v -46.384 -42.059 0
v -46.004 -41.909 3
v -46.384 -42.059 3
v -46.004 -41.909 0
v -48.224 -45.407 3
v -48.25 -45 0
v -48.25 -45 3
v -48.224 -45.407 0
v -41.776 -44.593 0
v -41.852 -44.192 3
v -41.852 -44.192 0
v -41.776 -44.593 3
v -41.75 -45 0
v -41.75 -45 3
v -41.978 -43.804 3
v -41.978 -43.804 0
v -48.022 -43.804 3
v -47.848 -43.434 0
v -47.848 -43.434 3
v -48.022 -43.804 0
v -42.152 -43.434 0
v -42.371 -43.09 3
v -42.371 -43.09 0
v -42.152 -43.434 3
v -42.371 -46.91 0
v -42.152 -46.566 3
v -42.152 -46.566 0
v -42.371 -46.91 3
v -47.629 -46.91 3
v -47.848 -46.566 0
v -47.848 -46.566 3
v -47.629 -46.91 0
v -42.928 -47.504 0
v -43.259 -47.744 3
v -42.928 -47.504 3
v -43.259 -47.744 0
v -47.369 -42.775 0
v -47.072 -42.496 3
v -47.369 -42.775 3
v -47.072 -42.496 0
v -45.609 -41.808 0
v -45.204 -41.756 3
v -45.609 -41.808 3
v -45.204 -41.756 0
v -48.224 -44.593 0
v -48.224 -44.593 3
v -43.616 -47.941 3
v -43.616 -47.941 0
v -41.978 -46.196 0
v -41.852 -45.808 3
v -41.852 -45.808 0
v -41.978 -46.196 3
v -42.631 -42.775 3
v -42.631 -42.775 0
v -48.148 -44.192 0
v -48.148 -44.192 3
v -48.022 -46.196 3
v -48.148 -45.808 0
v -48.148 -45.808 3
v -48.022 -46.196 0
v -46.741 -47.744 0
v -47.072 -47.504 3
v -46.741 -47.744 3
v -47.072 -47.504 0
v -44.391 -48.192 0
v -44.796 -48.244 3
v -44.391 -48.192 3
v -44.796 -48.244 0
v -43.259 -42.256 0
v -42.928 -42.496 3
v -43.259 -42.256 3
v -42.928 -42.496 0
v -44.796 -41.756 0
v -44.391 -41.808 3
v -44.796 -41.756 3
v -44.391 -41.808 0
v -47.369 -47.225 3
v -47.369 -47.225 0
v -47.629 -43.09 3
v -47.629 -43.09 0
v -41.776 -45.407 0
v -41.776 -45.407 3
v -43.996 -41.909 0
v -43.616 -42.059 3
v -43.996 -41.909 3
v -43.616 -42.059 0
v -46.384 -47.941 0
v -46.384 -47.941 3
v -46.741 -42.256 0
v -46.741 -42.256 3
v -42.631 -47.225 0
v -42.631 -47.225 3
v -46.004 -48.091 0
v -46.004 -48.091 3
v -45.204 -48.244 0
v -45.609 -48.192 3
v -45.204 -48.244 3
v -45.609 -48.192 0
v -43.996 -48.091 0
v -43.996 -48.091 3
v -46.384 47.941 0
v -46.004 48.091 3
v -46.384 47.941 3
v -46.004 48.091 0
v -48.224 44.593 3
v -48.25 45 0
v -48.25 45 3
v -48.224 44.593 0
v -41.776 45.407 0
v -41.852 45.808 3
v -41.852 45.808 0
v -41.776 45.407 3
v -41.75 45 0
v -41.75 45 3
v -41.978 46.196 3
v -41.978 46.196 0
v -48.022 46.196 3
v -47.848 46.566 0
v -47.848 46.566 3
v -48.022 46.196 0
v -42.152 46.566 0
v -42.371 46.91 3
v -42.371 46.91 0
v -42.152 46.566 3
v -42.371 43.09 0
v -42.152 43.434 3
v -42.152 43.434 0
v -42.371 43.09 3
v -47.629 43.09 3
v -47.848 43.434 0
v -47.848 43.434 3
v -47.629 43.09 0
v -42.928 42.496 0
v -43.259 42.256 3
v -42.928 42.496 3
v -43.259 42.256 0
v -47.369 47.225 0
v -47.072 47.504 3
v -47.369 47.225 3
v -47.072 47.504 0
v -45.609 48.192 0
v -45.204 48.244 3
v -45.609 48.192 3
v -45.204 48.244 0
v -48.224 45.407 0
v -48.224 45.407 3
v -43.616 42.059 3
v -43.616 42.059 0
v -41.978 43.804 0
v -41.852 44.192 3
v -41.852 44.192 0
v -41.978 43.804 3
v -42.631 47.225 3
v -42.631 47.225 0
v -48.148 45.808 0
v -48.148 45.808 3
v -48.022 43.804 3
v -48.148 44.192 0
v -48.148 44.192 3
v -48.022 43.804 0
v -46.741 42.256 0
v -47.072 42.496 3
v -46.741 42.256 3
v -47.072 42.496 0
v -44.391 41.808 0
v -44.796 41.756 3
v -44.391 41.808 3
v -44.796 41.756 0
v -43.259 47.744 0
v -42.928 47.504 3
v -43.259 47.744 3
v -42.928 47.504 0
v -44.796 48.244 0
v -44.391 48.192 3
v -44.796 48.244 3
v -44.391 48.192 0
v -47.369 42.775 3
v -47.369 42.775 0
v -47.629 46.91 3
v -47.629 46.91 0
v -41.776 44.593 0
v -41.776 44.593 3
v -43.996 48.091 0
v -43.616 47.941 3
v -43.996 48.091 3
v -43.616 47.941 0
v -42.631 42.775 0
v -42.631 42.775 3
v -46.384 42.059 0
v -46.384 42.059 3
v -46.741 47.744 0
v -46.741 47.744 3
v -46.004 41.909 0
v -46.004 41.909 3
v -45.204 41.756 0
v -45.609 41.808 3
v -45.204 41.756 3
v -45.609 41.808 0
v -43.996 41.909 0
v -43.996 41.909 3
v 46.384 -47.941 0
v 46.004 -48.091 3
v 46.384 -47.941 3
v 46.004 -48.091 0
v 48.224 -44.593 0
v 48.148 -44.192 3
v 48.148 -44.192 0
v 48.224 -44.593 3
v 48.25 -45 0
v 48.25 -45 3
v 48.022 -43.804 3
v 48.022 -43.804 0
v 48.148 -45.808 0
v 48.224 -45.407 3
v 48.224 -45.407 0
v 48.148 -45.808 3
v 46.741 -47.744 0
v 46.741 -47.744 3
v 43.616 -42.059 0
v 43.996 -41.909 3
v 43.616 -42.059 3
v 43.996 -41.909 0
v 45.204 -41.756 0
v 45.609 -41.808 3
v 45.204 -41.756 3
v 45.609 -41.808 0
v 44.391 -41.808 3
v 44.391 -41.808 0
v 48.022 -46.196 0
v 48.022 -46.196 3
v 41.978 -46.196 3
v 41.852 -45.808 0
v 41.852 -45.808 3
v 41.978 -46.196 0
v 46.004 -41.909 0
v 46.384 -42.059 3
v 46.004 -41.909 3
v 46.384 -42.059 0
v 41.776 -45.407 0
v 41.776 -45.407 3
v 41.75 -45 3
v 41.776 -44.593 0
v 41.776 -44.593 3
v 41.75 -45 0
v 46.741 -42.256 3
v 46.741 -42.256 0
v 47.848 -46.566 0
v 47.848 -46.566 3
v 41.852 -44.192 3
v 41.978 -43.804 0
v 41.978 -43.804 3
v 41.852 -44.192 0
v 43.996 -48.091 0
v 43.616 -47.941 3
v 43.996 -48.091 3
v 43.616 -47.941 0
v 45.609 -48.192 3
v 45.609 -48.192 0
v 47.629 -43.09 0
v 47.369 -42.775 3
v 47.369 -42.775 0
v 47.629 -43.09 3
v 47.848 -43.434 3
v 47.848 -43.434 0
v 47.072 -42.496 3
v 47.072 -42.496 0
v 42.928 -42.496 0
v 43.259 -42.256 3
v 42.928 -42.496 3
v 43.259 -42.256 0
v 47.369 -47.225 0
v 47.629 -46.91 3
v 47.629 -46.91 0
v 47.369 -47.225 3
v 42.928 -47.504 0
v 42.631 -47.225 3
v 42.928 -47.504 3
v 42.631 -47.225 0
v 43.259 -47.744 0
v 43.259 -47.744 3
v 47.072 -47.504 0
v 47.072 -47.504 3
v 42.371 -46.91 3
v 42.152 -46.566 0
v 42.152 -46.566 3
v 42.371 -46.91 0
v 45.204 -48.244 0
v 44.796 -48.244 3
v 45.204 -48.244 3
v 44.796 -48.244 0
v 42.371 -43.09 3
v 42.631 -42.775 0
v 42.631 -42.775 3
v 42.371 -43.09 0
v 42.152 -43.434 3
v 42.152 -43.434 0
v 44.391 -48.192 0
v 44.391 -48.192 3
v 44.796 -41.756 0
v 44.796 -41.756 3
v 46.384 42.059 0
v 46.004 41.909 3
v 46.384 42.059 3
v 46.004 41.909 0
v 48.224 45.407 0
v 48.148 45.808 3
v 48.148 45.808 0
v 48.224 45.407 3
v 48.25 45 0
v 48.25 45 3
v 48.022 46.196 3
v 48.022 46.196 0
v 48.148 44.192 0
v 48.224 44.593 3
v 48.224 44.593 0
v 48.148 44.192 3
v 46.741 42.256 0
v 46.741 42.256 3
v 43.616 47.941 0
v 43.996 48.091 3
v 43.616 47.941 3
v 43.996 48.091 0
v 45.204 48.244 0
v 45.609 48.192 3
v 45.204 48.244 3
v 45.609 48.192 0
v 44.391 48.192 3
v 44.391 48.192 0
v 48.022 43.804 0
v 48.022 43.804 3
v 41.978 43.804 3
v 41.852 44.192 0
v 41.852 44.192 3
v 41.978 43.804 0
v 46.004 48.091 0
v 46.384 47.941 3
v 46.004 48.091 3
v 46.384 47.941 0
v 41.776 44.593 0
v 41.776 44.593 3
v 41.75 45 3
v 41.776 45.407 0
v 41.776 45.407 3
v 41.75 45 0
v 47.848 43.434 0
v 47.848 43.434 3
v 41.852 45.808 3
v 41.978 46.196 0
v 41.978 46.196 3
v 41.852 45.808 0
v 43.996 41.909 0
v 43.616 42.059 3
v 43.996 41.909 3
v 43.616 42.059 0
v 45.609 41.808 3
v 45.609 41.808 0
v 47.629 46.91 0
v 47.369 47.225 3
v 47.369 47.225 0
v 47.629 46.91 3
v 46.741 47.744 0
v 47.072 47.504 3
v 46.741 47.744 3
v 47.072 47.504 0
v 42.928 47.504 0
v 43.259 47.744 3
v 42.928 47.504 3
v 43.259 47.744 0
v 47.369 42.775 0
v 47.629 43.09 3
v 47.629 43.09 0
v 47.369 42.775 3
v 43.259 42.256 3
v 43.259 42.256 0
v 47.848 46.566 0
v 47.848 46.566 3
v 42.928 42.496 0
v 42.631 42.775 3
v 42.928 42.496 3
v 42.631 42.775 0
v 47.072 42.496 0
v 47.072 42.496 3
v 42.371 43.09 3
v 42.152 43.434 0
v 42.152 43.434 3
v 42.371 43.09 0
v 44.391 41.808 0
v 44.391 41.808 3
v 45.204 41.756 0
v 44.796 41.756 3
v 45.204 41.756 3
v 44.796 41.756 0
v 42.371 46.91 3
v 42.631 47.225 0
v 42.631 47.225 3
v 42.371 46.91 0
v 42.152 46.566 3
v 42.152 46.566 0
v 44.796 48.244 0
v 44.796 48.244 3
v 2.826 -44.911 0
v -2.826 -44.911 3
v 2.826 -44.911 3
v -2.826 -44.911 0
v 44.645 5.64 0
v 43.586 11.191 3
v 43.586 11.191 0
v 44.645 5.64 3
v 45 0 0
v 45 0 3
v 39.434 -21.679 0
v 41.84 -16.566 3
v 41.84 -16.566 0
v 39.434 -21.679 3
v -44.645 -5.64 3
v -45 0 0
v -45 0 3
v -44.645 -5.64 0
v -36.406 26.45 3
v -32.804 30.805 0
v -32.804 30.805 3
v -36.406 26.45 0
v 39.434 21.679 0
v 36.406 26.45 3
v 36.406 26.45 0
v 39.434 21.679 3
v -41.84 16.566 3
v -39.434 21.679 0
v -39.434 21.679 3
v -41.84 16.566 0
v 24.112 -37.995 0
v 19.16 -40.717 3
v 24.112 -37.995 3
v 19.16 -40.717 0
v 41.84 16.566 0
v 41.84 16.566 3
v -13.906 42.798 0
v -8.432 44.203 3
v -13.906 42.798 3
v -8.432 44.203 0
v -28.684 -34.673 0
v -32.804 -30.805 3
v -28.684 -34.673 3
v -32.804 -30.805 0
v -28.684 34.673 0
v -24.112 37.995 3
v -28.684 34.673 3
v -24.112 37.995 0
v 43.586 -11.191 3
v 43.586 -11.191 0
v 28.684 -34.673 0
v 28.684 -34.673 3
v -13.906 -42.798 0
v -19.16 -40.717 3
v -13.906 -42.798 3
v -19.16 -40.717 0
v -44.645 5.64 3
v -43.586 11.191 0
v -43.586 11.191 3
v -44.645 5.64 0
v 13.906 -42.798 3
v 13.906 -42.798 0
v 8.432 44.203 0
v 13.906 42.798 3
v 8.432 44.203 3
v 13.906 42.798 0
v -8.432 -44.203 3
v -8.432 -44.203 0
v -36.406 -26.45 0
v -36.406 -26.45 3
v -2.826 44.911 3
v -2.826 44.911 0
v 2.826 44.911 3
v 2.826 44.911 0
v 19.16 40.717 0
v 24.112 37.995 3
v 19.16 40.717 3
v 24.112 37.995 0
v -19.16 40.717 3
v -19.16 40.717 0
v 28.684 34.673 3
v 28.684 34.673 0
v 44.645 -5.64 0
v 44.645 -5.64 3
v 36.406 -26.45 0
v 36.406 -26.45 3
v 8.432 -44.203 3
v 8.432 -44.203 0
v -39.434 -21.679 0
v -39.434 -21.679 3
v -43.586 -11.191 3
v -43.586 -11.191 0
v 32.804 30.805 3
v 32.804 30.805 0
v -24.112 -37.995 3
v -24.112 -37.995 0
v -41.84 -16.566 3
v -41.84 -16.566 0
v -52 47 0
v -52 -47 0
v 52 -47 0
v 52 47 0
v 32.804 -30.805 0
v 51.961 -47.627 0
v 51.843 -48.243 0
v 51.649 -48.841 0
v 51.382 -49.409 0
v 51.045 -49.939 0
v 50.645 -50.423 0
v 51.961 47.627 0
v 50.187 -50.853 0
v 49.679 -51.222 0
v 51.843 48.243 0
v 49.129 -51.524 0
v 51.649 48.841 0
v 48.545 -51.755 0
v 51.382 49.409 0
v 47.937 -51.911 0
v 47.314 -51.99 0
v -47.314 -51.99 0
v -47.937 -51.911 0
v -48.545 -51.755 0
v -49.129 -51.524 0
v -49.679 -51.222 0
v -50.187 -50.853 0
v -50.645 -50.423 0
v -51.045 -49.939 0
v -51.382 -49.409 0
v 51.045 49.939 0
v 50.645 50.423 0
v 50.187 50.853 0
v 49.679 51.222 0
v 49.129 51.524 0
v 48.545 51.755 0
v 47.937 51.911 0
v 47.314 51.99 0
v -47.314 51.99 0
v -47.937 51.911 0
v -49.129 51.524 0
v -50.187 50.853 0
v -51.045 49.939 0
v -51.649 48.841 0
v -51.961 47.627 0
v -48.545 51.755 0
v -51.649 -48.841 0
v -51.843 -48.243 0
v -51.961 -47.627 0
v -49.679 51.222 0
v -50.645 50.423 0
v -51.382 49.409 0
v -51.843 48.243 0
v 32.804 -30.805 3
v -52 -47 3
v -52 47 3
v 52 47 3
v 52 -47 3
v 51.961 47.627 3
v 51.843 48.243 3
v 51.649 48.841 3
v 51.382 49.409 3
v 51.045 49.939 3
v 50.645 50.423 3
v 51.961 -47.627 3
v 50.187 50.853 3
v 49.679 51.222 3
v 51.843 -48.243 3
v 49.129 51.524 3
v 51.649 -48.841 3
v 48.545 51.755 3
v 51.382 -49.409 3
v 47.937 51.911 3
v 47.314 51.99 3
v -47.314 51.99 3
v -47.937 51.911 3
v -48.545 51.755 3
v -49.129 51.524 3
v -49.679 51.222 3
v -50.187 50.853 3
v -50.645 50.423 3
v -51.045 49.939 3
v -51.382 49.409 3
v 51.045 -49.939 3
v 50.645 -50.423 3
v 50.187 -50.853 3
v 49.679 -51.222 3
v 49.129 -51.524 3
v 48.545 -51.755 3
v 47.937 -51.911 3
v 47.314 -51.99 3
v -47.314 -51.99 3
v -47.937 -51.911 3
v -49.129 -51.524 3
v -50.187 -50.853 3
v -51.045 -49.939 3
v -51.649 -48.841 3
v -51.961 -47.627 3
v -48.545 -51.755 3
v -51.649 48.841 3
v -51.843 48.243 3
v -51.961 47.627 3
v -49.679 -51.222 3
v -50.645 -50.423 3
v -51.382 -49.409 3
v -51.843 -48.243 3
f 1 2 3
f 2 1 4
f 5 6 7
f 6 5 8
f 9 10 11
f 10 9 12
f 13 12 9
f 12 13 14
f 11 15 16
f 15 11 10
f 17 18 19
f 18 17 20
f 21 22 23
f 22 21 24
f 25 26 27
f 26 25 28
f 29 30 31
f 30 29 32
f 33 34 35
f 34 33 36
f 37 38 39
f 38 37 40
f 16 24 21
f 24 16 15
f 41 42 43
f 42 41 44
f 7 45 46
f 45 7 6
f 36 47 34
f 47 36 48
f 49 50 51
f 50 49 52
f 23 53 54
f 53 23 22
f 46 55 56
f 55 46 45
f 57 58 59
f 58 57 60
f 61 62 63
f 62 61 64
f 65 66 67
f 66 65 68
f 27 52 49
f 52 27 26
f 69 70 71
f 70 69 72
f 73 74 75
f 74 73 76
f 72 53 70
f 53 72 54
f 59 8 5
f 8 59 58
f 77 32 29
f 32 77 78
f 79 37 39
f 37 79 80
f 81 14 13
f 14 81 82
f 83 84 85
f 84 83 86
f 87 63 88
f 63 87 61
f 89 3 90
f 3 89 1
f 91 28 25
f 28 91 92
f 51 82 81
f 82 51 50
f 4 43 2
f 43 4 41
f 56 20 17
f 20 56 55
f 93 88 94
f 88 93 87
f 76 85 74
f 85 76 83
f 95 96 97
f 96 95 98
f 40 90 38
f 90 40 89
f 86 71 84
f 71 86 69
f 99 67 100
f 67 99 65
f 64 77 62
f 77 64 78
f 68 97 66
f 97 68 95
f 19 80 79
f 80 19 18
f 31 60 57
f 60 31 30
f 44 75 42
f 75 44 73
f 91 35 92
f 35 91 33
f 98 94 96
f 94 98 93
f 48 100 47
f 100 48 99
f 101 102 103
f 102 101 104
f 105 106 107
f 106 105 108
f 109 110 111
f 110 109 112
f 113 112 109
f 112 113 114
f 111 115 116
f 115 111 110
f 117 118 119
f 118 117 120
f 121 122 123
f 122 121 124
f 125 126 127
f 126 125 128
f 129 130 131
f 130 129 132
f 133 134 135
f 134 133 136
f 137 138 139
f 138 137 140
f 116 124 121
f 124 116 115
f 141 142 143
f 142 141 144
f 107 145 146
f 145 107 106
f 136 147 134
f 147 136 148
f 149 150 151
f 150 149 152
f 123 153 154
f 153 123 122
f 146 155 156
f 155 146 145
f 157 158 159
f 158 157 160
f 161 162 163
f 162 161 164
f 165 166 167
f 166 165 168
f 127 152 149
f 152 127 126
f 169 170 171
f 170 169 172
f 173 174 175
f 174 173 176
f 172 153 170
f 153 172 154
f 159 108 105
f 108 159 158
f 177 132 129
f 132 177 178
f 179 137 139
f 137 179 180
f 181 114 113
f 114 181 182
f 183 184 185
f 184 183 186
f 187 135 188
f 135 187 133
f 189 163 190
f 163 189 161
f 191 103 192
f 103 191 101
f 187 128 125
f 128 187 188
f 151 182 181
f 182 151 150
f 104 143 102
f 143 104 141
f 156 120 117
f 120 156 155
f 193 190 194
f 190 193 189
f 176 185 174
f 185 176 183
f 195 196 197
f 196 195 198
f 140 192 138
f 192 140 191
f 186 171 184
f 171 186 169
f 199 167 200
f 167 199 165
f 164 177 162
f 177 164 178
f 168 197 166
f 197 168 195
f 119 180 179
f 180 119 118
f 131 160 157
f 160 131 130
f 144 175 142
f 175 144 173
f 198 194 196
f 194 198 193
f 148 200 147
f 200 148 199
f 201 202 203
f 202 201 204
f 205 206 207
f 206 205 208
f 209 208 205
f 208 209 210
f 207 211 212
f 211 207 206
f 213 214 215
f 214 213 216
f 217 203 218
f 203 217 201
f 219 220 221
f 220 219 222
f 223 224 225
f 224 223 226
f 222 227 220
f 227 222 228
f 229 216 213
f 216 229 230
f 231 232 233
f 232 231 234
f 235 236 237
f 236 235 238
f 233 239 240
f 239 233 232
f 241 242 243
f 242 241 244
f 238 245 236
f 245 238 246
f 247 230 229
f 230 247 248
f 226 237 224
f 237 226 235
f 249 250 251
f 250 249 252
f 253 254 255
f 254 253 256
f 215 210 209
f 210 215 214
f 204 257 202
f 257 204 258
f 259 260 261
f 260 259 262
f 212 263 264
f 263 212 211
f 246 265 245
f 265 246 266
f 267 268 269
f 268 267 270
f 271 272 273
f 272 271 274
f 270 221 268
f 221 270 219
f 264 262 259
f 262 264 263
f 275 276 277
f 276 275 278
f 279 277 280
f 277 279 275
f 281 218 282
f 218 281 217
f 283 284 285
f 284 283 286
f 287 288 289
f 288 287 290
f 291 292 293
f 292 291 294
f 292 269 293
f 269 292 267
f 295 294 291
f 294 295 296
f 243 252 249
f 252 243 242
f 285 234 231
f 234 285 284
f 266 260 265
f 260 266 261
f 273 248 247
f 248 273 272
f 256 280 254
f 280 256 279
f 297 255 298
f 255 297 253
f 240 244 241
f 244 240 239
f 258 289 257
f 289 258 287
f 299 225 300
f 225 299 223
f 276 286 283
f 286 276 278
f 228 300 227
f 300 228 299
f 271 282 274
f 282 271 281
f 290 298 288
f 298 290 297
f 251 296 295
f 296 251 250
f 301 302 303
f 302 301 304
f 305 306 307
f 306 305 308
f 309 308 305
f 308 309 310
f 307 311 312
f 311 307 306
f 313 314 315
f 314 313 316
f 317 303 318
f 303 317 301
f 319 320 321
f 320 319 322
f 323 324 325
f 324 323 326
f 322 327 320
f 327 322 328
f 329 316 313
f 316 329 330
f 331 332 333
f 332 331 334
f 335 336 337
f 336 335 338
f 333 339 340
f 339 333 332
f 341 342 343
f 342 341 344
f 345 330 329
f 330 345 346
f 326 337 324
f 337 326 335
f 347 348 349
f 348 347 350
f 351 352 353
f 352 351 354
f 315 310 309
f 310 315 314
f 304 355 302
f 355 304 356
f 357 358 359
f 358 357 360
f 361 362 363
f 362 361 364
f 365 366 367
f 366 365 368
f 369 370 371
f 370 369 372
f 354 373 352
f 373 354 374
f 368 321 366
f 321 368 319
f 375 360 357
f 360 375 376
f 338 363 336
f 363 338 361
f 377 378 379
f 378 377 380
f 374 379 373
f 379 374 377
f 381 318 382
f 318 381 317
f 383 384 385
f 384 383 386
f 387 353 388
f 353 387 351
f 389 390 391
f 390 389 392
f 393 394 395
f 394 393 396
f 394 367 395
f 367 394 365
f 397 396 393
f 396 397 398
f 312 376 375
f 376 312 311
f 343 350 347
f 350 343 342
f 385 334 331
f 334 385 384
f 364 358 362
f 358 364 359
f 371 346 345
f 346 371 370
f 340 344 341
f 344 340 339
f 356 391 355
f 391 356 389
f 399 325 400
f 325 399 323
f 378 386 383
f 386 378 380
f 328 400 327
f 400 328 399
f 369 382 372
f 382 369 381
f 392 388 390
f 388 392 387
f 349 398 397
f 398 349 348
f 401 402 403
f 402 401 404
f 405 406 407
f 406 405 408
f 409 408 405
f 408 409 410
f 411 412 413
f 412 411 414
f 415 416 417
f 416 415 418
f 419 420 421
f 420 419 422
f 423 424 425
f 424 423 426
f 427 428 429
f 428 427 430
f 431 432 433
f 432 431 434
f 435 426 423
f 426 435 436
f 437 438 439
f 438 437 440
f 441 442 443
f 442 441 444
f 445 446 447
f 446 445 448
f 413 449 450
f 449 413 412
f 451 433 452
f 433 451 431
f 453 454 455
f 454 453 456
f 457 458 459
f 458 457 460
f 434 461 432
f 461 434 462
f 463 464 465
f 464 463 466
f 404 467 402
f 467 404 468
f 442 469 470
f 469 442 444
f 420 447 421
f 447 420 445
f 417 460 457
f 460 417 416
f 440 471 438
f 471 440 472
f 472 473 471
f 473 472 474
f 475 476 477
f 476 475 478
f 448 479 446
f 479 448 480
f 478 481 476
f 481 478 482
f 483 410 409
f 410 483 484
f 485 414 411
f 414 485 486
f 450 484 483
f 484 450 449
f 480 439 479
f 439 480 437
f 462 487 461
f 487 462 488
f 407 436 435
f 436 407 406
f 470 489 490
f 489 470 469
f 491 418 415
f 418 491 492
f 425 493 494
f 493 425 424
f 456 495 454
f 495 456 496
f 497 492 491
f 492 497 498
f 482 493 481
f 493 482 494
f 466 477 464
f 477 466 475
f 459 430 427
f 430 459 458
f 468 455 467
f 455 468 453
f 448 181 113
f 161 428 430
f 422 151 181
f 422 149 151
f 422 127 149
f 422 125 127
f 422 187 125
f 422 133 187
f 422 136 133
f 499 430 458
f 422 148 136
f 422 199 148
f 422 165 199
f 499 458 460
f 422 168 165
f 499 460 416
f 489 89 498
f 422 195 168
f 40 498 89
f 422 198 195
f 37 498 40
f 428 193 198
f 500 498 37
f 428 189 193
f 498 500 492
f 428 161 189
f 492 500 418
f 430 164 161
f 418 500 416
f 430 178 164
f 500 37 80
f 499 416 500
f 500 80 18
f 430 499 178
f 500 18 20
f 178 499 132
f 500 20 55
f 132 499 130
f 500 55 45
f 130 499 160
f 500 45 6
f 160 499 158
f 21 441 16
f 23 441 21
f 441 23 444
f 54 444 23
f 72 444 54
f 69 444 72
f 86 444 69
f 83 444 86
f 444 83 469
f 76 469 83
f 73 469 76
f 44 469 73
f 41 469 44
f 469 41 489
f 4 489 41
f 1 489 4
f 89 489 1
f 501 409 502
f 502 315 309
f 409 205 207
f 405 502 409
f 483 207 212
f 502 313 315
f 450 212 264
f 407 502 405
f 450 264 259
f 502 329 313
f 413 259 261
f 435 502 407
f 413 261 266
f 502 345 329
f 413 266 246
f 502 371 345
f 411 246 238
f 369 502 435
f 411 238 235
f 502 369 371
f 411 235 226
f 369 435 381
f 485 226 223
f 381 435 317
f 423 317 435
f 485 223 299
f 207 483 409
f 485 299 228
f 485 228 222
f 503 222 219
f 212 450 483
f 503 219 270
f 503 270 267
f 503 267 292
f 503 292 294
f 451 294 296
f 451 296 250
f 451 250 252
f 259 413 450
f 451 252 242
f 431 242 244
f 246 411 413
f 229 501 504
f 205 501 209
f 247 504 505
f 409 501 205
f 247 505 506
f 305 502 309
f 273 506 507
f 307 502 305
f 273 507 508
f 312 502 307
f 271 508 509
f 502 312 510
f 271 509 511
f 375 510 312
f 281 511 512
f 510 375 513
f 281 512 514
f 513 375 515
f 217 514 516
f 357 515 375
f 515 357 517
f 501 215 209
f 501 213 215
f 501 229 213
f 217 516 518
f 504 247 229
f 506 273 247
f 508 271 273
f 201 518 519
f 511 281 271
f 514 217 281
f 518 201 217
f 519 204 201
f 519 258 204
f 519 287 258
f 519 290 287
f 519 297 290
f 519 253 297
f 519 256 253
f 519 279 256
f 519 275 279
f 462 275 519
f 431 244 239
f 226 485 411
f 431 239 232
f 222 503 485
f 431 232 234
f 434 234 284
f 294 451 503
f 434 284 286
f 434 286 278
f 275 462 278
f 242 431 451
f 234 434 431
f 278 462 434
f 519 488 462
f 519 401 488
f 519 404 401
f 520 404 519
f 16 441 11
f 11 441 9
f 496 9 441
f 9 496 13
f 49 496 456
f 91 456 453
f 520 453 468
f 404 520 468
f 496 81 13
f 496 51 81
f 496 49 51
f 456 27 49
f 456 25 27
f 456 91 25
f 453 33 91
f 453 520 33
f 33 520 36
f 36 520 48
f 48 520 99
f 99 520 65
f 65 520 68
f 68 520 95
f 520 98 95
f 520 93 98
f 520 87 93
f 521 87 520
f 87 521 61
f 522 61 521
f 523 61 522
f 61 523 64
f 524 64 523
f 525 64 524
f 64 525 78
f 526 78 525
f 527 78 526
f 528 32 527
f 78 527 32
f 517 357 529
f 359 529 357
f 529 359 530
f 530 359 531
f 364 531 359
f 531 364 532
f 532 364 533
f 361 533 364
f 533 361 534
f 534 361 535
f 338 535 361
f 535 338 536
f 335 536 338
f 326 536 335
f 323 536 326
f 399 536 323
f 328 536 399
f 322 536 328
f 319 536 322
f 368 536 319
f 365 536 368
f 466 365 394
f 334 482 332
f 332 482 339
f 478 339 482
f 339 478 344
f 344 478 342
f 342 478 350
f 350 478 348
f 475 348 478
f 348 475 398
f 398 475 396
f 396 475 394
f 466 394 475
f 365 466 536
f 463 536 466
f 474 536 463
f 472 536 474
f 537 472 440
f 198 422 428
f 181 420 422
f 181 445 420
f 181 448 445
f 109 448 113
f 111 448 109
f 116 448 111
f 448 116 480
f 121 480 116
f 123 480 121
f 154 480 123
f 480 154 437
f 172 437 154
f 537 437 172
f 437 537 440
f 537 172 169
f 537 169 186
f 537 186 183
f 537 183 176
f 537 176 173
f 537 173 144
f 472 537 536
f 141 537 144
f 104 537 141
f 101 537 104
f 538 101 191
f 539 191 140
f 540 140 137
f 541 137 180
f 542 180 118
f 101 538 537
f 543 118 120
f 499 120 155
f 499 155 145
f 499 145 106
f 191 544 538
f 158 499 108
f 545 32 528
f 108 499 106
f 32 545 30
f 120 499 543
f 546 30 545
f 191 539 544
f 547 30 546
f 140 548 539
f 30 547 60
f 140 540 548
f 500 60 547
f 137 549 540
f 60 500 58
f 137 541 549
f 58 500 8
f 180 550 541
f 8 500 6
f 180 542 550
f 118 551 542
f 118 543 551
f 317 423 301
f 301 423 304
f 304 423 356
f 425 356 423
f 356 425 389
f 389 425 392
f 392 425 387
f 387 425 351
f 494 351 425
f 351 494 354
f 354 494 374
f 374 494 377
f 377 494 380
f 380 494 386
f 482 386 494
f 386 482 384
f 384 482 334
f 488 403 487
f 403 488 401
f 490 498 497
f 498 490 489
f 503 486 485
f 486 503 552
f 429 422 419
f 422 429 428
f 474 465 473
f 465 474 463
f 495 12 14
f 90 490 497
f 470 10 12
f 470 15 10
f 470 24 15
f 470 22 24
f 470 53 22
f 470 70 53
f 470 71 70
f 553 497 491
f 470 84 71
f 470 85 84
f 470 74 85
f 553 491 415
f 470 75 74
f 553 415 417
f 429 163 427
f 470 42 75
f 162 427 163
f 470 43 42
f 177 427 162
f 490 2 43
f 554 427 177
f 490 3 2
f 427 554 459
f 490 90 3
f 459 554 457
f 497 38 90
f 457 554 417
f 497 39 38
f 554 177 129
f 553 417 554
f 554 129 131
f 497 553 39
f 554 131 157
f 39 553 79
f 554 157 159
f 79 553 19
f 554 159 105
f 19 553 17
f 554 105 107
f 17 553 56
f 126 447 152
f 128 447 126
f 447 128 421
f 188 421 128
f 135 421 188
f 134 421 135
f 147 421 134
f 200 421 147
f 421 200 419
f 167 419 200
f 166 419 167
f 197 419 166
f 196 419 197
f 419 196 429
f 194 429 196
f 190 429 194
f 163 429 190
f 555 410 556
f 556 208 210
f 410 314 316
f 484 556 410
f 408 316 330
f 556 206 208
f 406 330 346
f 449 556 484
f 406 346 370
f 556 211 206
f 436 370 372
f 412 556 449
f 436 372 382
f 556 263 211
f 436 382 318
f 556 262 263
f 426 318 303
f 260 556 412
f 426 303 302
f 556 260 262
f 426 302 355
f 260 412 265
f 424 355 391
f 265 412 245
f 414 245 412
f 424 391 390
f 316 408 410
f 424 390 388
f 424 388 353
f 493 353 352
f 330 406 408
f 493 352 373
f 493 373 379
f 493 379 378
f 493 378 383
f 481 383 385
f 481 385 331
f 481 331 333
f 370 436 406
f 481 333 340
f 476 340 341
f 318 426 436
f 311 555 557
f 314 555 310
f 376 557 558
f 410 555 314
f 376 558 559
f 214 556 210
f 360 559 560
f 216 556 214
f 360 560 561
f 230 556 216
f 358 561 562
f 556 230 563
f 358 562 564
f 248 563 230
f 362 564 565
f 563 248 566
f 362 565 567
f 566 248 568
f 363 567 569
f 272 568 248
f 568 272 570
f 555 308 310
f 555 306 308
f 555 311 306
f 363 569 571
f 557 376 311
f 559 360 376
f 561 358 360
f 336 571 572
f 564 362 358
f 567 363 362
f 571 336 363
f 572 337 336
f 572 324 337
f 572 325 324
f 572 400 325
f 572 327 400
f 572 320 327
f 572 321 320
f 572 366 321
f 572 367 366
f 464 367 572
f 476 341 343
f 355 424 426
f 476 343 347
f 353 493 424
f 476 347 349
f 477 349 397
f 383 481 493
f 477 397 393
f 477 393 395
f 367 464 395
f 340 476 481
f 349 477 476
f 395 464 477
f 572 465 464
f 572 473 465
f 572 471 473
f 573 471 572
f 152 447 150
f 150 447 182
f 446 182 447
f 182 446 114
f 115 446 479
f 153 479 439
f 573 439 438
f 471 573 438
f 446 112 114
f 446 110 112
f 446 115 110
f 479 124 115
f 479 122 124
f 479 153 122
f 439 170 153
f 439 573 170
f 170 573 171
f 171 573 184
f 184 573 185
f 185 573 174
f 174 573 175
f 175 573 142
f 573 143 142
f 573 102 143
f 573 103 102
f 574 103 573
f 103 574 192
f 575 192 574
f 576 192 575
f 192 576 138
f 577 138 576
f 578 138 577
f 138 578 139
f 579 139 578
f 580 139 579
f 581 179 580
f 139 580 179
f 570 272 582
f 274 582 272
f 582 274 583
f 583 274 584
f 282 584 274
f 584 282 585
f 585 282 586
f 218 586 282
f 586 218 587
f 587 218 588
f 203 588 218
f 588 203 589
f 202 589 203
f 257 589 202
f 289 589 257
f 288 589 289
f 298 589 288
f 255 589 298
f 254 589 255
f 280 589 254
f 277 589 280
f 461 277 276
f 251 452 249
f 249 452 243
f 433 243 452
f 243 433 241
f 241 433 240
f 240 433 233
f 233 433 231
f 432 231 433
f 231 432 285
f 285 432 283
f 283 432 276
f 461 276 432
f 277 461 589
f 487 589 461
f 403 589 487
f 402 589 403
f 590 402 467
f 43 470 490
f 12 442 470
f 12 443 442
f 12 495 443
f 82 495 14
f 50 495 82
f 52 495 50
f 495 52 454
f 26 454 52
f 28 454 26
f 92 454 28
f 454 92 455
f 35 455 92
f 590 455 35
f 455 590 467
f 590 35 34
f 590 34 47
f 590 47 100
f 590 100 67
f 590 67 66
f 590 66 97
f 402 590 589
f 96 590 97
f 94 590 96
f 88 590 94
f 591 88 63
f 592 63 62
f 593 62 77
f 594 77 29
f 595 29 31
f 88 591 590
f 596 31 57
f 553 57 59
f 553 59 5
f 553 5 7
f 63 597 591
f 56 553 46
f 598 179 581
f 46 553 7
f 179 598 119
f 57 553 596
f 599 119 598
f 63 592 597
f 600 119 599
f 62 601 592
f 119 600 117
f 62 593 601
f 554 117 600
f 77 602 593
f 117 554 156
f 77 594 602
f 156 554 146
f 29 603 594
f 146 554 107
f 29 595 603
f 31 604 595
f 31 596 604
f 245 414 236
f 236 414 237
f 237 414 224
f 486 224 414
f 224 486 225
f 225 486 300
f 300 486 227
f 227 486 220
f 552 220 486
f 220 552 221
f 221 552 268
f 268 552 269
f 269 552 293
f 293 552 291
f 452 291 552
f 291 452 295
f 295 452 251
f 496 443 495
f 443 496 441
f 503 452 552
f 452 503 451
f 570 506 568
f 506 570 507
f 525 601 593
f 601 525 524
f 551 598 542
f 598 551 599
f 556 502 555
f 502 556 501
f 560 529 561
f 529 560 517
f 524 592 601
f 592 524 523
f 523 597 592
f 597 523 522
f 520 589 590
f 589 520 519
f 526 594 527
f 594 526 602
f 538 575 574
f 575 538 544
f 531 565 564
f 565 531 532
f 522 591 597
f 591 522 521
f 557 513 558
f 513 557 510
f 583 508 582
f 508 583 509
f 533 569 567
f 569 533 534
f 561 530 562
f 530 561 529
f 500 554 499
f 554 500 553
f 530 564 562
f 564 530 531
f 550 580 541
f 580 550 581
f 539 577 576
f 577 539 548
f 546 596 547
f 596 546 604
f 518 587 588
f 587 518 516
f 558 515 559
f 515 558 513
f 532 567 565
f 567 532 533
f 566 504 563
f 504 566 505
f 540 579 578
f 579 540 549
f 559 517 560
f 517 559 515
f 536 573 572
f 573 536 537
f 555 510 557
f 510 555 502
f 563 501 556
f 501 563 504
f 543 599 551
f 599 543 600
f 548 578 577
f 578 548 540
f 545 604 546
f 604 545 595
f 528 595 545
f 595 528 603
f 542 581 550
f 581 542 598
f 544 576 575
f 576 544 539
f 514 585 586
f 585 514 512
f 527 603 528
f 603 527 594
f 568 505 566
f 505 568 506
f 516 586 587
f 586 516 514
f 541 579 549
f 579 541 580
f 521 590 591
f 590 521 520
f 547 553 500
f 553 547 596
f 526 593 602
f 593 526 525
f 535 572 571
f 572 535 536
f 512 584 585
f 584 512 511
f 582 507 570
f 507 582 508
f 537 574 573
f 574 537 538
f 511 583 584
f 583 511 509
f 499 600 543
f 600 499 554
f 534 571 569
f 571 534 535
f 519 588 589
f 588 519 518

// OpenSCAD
$fn = 50;


difference() {
	union() {
		hull() {
			translate(v = [-47.0000000000, 47.0000000000, 0]) {
				cylinder(h = 3, r = 5);
			}
			translate(v = [47.0000000000, 47.0000000000, 0]) {
				cylinder(h = 3, r = 5);
			}
			translate(v = [-47.0000000000, -47.0000000000, 0]) {
				cylinder(h = 3, r = 5);
			}
			translate(v = [47.0000000000, -47.0000000000, 0]) {
				cylinder(h = 3, r = 5);
			}
		}
	}
	union() {
		#translate(v = [-45.0000000000, -45.0000000000, -100.0000000000]) {
			cylinder(h = 200, r = 3.2500000000);
		}
		#translate(v = [-45.0000000000, 45.0000000000, -100.0000000000]) {
			cylinder(h = 200, r = 3.2500000000);
		}
		#translate(v = [45.0000000000, -45.0000000000, -100.0000000000]) {
			cylinder(h = 200, r = 3.2500000000);
		}
		#translate(v = [45.0000000000, 45.0000000000, -100.0000000000]) {
			cylinder(h = 200, r = 3.2500000000);
		}
		#cylinder(h = 3, r = 45.0000000000);
	}
}
